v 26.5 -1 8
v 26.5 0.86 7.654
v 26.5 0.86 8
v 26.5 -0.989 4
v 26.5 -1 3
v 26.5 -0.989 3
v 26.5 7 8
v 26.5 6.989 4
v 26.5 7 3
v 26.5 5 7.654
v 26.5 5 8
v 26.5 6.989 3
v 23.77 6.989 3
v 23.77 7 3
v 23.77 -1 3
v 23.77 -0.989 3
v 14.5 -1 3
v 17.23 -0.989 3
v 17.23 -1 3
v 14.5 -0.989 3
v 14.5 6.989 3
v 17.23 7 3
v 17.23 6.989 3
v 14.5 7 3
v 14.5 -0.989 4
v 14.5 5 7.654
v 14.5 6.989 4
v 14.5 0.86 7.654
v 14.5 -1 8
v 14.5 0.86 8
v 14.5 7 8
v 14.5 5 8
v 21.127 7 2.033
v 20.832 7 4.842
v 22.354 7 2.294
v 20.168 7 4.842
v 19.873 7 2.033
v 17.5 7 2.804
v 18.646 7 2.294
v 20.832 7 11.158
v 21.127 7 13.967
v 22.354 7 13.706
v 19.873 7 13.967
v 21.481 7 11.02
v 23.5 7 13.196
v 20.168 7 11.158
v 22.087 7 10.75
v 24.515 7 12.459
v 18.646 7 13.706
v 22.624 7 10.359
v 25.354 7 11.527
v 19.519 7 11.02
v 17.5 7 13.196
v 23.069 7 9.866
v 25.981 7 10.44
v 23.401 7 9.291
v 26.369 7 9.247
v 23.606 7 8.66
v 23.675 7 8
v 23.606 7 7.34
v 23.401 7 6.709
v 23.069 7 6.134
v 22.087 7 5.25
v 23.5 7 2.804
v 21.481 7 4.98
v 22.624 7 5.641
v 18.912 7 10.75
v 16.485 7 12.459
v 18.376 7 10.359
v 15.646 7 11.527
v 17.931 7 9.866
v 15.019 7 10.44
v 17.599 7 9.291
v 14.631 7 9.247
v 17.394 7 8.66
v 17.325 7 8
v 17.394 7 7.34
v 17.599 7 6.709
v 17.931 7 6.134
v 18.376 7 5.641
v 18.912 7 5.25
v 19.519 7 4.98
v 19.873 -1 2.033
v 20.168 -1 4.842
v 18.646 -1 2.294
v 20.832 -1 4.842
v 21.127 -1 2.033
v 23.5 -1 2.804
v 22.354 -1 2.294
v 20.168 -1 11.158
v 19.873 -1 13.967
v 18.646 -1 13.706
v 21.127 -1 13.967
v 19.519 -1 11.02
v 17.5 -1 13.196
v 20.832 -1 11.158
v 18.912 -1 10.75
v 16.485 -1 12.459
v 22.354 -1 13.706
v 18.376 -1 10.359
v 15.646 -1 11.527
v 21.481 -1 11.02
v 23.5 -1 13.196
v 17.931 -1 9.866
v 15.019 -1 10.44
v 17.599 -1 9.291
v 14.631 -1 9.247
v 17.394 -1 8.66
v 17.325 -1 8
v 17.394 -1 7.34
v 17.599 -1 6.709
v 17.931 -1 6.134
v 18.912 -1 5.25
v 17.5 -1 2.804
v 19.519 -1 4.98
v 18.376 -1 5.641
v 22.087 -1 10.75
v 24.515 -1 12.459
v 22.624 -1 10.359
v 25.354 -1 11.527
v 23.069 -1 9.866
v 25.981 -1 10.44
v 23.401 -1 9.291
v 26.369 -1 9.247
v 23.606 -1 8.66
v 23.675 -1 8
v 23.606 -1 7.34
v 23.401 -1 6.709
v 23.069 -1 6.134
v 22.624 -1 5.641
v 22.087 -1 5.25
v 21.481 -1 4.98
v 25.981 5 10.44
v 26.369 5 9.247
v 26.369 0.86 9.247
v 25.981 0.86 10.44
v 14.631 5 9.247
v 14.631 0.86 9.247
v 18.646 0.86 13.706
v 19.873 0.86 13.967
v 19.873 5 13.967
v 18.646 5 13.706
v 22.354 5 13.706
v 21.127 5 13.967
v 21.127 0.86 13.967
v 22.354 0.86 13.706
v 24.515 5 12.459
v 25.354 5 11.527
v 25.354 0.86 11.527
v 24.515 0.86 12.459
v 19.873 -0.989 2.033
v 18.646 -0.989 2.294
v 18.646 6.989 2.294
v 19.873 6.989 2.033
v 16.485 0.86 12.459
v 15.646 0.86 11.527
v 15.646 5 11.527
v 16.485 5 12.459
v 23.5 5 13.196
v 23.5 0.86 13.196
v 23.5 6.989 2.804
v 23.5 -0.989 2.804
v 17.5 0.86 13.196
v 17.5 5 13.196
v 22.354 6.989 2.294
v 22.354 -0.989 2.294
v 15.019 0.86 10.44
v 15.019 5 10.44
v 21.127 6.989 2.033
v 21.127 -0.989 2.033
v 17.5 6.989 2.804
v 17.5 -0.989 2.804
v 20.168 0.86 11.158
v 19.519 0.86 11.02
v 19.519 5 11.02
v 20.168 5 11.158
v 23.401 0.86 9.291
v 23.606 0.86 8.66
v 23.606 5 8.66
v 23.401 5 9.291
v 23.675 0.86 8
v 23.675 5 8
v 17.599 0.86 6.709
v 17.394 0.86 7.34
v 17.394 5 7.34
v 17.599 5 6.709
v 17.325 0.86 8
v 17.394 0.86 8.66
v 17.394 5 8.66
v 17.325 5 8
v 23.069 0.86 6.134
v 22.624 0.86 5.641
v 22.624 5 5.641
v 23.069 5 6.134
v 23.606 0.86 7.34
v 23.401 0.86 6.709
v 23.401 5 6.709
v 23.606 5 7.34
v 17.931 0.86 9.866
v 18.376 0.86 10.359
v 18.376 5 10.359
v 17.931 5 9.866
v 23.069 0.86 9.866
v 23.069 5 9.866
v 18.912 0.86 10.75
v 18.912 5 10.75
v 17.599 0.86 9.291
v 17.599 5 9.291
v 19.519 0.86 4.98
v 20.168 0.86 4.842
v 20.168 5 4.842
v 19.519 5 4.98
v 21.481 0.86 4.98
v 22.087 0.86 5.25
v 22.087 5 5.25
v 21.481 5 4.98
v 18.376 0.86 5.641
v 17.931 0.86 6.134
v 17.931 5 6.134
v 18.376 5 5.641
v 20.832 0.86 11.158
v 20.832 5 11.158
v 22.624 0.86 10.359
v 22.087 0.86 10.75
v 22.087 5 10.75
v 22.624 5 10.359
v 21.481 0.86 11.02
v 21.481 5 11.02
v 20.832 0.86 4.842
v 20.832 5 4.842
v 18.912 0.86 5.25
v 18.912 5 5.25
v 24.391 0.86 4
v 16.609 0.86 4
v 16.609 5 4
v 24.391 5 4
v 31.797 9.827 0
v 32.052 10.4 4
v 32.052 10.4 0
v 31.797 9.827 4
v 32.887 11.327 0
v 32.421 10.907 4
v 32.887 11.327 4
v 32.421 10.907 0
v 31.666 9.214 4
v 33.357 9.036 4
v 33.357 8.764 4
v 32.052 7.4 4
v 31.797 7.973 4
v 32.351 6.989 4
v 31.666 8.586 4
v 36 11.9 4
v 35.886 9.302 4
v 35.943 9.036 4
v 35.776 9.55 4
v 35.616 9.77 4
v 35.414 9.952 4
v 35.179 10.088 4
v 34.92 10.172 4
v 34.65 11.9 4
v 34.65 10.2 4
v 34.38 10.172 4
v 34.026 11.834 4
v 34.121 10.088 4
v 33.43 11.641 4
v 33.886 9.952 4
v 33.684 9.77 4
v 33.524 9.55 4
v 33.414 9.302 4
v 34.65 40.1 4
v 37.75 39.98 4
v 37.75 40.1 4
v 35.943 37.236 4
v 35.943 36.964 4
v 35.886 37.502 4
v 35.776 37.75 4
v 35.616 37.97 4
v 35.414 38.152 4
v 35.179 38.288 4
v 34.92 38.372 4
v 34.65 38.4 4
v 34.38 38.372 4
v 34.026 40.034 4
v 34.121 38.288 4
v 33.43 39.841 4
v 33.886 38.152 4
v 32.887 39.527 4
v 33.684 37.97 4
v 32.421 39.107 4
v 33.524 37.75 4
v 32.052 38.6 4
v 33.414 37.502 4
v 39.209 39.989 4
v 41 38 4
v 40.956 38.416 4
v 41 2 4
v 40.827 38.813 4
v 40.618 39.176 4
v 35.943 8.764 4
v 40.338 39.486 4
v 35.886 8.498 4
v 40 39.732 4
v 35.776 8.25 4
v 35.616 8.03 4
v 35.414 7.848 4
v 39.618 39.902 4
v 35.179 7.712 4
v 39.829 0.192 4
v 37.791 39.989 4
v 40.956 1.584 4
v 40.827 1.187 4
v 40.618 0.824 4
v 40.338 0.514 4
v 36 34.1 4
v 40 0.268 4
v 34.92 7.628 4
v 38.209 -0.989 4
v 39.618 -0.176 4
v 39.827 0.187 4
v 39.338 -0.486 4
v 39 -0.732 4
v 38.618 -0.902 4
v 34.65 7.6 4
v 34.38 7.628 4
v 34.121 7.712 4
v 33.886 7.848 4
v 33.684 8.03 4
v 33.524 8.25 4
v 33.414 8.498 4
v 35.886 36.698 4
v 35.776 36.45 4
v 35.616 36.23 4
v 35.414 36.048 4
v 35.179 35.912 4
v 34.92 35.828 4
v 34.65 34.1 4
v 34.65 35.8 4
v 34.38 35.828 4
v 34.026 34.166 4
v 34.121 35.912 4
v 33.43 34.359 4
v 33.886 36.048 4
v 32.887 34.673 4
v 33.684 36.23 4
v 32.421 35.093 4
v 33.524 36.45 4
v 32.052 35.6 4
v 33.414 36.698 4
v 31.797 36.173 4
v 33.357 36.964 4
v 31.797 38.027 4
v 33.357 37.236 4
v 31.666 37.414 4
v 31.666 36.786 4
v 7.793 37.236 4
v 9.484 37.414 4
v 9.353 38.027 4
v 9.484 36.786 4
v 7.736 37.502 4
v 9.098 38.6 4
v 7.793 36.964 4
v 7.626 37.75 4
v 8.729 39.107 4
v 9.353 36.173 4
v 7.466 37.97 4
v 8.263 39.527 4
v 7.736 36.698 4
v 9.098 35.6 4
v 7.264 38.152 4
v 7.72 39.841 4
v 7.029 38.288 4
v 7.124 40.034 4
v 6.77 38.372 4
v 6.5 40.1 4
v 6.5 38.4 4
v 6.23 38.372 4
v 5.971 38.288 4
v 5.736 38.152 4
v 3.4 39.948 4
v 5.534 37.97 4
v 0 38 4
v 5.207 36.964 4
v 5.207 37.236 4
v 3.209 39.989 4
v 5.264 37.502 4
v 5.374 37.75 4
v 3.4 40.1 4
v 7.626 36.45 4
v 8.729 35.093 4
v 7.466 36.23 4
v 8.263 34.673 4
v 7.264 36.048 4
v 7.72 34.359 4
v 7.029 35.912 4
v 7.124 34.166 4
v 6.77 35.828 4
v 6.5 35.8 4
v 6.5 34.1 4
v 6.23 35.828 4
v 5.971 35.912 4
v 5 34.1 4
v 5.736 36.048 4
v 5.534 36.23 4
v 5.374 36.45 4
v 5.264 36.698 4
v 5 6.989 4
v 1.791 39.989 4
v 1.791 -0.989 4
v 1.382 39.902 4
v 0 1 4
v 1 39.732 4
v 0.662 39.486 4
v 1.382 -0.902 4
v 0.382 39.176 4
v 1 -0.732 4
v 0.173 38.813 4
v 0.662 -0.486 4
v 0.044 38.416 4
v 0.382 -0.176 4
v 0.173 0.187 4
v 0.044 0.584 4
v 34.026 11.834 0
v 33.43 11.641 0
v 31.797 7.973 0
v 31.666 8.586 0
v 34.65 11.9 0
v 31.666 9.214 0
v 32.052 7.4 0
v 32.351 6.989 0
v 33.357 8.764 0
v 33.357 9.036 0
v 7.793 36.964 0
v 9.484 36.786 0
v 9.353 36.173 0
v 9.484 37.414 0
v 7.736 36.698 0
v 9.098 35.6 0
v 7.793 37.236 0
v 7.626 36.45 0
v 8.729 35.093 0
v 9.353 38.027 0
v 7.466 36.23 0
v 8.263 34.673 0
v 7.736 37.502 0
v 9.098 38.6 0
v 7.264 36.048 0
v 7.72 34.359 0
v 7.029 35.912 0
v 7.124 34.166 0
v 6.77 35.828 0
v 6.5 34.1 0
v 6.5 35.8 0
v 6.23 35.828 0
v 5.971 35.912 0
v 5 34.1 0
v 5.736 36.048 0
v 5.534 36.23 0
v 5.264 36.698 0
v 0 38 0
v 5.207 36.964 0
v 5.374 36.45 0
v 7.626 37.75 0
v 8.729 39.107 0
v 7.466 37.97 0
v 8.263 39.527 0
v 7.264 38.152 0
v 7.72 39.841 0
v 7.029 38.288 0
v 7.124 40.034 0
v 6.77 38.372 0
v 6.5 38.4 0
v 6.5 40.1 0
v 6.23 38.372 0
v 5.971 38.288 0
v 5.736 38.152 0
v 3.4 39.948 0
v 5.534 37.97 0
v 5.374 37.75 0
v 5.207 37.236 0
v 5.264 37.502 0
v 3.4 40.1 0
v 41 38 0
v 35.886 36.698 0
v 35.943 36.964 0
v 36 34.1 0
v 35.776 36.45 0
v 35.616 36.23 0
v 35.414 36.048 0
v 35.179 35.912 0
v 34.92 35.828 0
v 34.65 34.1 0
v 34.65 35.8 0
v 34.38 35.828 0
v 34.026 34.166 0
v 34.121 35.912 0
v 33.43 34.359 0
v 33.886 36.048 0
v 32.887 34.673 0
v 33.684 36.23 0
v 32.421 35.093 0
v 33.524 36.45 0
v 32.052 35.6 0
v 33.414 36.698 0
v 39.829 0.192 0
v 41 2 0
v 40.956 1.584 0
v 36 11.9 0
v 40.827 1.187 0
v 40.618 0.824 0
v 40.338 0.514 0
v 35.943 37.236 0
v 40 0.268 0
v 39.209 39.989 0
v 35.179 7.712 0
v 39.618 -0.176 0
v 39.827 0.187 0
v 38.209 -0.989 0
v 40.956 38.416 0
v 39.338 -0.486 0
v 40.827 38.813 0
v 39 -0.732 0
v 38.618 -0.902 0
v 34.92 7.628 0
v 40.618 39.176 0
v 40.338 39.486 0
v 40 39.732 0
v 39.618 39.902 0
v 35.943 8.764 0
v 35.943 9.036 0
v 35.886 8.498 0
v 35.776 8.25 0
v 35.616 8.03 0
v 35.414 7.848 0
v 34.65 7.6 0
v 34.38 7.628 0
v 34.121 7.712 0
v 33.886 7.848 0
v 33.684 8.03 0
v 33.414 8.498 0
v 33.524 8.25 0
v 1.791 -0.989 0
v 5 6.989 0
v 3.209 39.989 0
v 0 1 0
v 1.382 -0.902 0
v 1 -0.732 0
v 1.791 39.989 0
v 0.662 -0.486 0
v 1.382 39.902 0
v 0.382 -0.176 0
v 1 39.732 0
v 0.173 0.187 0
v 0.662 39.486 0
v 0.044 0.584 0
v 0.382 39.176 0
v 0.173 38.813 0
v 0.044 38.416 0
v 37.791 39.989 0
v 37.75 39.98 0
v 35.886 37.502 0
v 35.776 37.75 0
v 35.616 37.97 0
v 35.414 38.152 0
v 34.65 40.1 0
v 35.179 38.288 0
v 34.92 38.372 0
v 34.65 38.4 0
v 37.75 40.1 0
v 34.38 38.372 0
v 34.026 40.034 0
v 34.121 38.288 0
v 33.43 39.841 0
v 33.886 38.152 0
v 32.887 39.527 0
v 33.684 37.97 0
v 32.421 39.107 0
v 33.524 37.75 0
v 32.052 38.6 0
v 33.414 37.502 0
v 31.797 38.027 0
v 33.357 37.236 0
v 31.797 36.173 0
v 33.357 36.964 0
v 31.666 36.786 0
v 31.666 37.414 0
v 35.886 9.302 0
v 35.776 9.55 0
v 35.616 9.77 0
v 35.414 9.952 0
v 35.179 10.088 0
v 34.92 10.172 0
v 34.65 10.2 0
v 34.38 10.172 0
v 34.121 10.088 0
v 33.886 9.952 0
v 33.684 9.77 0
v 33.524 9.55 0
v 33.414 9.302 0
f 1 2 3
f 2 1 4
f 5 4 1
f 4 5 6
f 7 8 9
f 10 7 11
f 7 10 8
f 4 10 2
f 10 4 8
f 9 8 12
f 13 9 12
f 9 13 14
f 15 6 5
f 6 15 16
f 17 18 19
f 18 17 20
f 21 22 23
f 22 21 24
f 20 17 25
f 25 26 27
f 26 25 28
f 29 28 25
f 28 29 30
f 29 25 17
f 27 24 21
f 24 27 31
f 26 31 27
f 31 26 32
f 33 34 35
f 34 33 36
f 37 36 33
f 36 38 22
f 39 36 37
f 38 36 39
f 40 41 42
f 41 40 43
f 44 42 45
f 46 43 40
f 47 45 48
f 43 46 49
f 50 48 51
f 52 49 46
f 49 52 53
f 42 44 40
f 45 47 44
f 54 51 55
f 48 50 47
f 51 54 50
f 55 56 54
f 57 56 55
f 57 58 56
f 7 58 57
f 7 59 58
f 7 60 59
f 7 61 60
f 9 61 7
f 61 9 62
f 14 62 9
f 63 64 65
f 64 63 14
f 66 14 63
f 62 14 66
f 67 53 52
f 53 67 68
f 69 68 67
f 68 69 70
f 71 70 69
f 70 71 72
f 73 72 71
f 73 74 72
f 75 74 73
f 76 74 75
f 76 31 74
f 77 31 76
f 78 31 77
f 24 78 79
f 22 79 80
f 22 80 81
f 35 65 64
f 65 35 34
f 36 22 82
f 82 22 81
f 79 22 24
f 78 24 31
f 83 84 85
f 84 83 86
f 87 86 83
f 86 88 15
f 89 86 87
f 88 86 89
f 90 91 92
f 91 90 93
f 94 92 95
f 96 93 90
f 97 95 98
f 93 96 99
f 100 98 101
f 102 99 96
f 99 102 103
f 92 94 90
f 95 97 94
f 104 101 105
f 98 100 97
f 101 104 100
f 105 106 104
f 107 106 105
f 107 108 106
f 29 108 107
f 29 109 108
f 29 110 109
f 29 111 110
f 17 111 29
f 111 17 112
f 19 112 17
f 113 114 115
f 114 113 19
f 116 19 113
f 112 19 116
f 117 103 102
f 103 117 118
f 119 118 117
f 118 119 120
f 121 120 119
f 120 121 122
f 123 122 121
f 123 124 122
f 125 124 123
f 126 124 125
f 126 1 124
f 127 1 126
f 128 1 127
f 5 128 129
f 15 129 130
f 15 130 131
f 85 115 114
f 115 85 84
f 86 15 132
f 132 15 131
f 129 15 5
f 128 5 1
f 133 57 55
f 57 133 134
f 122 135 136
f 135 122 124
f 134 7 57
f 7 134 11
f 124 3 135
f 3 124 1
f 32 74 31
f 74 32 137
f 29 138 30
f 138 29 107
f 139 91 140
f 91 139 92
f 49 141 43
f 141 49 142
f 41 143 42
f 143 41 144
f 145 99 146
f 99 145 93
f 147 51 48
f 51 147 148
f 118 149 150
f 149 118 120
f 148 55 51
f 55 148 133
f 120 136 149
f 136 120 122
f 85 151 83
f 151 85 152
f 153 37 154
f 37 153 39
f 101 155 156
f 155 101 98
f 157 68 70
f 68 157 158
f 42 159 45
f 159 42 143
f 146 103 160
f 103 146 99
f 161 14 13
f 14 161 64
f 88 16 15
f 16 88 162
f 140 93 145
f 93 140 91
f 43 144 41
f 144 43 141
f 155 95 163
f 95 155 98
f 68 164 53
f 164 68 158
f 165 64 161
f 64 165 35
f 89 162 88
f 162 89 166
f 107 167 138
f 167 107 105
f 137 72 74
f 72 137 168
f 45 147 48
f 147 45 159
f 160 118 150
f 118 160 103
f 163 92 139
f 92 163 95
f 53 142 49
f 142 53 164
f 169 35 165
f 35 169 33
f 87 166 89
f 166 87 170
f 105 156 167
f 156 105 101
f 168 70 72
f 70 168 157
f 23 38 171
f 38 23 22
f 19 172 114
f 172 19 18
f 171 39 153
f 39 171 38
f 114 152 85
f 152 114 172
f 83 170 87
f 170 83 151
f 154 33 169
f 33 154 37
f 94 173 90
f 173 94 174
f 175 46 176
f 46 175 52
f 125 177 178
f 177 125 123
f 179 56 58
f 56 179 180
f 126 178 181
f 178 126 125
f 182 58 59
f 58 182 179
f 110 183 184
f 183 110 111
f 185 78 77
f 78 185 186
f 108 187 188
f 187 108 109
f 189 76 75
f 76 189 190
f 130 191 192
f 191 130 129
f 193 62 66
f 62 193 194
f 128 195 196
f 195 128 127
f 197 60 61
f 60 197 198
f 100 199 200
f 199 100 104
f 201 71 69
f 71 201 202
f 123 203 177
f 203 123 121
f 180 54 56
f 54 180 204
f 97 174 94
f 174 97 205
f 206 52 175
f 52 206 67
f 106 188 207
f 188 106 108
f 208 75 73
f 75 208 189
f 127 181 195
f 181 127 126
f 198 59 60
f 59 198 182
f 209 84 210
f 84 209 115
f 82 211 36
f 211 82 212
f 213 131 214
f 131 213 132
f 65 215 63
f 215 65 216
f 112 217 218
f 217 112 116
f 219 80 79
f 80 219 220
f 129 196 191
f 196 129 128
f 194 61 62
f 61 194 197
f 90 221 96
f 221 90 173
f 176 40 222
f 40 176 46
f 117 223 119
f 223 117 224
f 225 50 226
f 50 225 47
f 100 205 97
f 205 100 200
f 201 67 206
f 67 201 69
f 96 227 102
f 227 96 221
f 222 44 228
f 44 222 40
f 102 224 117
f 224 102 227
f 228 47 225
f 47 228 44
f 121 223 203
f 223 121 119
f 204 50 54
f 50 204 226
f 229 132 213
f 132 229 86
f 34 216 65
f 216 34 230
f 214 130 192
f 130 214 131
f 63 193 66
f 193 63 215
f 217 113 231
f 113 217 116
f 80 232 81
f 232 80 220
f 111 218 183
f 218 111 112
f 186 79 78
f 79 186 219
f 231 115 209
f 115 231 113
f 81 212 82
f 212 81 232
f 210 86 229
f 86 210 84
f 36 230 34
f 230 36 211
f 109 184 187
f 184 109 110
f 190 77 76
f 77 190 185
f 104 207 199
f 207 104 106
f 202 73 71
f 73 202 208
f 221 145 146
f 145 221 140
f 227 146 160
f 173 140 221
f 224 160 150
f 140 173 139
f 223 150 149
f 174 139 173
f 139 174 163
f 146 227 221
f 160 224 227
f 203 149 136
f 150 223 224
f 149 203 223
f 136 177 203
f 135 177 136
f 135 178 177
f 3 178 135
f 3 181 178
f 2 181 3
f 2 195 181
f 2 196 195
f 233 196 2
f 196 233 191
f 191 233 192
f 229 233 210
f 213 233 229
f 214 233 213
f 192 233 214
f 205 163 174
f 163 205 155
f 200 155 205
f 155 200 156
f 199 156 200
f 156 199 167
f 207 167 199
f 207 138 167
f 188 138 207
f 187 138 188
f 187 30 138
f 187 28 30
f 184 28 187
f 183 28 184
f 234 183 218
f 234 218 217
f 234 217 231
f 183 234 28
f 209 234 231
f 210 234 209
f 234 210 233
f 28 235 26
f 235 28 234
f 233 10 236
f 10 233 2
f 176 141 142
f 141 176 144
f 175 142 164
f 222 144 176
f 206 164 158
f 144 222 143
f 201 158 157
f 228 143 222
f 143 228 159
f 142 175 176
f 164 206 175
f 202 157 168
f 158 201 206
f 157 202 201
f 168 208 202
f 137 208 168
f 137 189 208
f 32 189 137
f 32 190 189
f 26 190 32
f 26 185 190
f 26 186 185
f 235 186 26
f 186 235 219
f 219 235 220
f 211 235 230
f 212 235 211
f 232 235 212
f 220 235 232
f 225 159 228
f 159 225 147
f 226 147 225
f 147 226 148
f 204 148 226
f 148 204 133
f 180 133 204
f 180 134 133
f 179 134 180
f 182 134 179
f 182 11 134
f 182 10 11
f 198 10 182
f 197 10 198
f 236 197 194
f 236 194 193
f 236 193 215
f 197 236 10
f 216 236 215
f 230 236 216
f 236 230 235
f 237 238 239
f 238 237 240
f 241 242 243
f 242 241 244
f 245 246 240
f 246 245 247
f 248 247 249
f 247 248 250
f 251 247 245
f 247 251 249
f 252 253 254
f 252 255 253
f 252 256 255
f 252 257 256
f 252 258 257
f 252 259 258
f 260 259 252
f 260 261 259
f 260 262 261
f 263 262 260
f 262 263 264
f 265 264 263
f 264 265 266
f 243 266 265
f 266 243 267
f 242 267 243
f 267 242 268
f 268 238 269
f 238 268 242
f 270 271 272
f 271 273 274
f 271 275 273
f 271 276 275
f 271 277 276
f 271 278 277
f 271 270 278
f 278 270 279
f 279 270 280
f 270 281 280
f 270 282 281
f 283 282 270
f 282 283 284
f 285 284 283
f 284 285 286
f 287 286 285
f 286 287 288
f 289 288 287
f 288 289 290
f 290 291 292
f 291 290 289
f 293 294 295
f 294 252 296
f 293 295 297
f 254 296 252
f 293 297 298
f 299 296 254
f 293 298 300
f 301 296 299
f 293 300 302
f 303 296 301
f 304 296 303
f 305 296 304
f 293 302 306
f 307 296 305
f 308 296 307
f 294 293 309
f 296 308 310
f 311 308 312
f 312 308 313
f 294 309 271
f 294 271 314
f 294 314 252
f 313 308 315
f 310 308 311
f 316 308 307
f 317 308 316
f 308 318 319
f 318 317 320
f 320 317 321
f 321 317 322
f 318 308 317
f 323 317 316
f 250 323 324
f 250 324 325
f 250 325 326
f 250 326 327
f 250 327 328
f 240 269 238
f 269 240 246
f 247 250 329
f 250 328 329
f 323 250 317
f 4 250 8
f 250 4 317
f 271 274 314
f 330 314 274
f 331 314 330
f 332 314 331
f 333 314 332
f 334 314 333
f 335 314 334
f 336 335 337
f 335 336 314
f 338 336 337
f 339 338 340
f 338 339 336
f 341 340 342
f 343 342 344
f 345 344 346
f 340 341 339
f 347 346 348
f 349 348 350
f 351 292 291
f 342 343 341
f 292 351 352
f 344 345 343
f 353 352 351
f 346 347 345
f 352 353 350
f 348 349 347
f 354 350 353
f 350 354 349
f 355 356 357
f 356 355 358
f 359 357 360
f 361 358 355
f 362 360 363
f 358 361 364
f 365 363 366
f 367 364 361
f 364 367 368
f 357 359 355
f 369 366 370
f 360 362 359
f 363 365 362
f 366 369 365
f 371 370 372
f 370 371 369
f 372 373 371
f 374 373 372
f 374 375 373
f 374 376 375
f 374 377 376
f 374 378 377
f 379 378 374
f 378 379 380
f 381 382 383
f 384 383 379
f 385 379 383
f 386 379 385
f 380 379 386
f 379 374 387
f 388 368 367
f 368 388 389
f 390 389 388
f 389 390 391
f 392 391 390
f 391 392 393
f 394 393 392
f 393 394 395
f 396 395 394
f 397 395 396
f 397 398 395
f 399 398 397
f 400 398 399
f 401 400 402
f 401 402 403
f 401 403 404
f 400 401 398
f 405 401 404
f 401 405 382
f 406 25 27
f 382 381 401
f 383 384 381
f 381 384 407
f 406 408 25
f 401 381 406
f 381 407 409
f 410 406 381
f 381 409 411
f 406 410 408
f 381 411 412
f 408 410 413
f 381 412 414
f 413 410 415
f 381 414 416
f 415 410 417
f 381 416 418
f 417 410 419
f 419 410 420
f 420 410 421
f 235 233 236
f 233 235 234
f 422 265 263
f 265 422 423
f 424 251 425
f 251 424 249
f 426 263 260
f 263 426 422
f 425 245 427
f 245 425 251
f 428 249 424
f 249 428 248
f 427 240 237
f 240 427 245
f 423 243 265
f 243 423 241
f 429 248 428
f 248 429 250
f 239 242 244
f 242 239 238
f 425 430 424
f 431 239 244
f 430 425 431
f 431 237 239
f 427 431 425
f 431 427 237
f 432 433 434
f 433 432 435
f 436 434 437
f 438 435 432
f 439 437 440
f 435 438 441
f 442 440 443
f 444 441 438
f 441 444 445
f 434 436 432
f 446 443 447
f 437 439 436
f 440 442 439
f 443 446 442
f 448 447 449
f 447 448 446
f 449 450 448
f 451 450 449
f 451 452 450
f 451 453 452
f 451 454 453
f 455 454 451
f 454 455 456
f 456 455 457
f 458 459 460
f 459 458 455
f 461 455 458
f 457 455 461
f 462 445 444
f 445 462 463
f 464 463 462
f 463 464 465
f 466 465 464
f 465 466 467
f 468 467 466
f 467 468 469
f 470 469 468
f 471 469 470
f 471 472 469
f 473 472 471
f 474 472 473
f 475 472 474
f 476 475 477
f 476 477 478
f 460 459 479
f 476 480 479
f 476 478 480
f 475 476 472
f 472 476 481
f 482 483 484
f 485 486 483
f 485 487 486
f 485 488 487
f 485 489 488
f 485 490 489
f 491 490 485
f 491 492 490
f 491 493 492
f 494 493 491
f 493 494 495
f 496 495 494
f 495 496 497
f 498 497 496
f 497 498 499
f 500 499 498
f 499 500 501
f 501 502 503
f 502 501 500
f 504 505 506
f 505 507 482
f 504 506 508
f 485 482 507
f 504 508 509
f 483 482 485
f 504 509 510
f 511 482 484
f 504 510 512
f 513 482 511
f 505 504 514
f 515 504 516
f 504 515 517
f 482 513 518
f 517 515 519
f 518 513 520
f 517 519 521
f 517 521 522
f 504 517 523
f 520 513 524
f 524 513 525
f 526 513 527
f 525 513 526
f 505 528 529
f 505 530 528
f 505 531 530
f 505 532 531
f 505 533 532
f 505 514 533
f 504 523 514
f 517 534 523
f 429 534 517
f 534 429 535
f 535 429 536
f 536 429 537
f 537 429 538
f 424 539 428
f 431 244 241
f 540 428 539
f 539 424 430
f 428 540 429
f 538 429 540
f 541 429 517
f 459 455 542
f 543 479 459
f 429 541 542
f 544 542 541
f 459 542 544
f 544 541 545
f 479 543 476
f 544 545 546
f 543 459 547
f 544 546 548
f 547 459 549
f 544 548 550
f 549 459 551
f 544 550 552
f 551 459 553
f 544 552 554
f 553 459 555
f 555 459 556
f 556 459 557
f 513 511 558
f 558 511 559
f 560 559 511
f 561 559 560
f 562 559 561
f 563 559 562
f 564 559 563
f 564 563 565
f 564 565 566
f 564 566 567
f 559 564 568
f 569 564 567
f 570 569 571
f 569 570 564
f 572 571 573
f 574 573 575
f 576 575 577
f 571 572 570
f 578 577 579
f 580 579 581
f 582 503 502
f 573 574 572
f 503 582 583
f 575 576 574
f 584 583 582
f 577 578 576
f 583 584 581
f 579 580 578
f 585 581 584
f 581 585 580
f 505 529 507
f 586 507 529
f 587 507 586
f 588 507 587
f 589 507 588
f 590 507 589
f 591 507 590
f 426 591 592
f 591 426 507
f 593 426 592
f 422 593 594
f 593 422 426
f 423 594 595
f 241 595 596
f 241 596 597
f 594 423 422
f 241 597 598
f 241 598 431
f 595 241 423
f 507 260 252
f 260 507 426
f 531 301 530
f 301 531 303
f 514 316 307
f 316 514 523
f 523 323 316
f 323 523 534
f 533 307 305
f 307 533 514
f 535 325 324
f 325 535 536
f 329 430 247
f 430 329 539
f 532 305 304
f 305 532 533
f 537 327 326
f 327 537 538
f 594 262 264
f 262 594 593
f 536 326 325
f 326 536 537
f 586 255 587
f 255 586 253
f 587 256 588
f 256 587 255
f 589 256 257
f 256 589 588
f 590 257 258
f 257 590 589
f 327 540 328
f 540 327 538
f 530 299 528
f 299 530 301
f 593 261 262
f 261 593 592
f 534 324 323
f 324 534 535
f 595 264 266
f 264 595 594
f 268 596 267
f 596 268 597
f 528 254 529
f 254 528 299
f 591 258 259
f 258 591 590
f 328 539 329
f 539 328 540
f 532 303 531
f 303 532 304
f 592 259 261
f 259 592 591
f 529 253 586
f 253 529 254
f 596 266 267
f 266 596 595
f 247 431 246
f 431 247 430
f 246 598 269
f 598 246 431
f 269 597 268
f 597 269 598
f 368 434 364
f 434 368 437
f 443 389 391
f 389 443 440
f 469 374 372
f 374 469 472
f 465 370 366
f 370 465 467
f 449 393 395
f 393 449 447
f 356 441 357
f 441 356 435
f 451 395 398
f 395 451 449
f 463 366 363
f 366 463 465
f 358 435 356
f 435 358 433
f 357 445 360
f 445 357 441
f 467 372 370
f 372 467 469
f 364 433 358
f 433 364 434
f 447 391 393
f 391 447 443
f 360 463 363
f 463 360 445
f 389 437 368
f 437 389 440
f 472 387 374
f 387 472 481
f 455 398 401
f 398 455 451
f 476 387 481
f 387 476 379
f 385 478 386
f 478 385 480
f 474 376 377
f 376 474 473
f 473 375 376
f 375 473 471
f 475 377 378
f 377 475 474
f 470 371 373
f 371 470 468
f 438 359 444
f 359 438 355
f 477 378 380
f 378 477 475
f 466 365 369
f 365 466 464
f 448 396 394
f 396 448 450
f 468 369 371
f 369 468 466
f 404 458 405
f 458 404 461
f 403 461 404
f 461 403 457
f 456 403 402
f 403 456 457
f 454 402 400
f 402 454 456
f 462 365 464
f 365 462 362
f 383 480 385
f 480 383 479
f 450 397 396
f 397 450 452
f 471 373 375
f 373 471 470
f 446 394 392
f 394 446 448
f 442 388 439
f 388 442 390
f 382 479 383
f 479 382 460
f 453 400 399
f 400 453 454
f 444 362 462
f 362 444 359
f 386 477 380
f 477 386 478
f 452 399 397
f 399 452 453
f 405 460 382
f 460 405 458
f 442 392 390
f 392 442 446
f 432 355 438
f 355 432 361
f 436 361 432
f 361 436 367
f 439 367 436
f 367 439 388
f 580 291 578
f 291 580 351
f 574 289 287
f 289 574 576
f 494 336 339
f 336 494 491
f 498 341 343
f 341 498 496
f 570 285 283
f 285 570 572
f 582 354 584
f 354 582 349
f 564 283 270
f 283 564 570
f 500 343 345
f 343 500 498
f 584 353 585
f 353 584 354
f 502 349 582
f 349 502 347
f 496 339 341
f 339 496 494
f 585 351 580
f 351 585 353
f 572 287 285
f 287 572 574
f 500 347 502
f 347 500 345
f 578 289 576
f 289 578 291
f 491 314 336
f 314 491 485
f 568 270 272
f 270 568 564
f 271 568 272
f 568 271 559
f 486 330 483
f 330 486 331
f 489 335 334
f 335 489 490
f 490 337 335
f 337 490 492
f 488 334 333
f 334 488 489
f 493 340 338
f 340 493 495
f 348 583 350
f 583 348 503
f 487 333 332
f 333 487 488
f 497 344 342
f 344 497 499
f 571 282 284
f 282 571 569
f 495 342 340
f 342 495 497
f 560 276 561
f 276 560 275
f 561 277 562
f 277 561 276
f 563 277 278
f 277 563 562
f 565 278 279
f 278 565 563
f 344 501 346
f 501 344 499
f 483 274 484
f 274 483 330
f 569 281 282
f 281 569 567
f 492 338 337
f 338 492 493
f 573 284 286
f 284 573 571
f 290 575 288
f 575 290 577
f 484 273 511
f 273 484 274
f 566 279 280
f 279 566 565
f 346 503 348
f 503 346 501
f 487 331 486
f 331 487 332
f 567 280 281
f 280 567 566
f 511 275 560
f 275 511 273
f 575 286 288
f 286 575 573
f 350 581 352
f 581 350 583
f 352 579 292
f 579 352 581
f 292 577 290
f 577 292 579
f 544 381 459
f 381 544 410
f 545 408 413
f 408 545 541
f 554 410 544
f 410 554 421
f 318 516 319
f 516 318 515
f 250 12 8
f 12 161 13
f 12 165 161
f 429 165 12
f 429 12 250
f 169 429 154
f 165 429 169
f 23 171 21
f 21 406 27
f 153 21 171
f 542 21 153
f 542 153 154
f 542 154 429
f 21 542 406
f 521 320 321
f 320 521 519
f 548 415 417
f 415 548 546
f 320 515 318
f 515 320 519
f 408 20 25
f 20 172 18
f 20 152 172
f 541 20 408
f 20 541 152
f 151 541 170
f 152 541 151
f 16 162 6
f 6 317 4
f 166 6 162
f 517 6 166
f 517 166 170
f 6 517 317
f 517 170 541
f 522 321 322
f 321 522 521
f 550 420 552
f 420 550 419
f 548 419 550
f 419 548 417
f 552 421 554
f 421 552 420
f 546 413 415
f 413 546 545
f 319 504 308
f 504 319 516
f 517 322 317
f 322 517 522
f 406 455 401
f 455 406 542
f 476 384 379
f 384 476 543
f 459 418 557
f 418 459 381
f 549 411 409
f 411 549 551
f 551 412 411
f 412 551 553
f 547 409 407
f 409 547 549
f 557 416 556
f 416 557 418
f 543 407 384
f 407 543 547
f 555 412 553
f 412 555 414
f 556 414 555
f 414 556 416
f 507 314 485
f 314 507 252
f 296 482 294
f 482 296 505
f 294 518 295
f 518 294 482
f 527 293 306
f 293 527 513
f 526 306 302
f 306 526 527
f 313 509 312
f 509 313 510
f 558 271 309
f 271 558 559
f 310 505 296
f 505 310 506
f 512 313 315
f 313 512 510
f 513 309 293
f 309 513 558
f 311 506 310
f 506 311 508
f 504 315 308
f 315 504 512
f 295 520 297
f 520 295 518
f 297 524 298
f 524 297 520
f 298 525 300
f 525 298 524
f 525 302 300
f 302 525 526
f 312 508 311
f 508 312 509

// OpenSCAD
// 1/4-20 (1/4" diameter, 20 threads per inch) socket for attachment to a tripod
// 1/4-20 nuts are commonly 7/16" from side to side (11.11mm)

// width=35;
// height=35;

$fn=30;

connector();
translate([0,-1,0]) plate(width=40,height=8);
translate([0,0,0]) plate(width=5,height=40);
translate([36,0,0]) plate(width=5,height=40);

// translate([6.5,8.9,0])rotate([0,0,90]) smallHole();
translate([34.65,8.9,0])rotate([0,0,-90]) smallHole();
translate([6.5,37.1,0]) rotate([0,0,90]) smallHole();
translate([34.65,37.1,0])rotate([0,0,-90]) smallHole();

module holeLocations() {
   /* locations of holes */
   translate([6.5,8.9,-0.1]) {
      translate([0,0,0]) color("green") cylinder(r=1.2,h=8);
      translate([28.2,0,0]) color("green") cylinder(r=1.2,h=8);
      translate([0,28.2,0]) color("green") cylinder(r=1.2,h=8);
      translate([28.2,28.2,0]) color("green") cylinder(r=1.2,h=8);
   }
}

module smallHole() {
   difference() {
      union() {
         cylinder(h=4,r=3);
         translate([-3,0,0]) cube([6,3.1,4]);
      }
      translate([0,0,-0.05]) cylinder(h=4.1,r=1.3);
   }
}


/* connector() -- to capture hex nut for mounting
 */
module connector() {
   difference() {
      union() {
         translate([41/2 - 6, -1, 3]) cube([12,8,5]);
         translate([41/2,7,8]) rotate([90,0,0]) cylinder(r=6,h=8);
      }
      union() {
         translate([41/2, 9,8]) rotate([90,0,0]) cylinder(r=6.35/2,h=13,$fn=30);
         translate([41/2,5,8]) rotate([90,0,0]) cylinder(r=12.4/2,h=4.14,$fn=6);
         translate([41/2-6,1-0.14,8]) cube([14,4.14,6]);
      }
   }
}

/* plate() -- base of the mounting plate
 */
module plate(width=35,height=35,depth=4) {
   hull() {
      translate([2,2,0]) cylinder(r=2,h=depth);
      translate([width-2,2,0]) cylinder(r=2,h=depth);
      translate([2,height-2,0]) cylinder(r=2,h=depth);
      translate([width-2,height-2,0]) cylinder(r=2,h=depth);
   }
}
